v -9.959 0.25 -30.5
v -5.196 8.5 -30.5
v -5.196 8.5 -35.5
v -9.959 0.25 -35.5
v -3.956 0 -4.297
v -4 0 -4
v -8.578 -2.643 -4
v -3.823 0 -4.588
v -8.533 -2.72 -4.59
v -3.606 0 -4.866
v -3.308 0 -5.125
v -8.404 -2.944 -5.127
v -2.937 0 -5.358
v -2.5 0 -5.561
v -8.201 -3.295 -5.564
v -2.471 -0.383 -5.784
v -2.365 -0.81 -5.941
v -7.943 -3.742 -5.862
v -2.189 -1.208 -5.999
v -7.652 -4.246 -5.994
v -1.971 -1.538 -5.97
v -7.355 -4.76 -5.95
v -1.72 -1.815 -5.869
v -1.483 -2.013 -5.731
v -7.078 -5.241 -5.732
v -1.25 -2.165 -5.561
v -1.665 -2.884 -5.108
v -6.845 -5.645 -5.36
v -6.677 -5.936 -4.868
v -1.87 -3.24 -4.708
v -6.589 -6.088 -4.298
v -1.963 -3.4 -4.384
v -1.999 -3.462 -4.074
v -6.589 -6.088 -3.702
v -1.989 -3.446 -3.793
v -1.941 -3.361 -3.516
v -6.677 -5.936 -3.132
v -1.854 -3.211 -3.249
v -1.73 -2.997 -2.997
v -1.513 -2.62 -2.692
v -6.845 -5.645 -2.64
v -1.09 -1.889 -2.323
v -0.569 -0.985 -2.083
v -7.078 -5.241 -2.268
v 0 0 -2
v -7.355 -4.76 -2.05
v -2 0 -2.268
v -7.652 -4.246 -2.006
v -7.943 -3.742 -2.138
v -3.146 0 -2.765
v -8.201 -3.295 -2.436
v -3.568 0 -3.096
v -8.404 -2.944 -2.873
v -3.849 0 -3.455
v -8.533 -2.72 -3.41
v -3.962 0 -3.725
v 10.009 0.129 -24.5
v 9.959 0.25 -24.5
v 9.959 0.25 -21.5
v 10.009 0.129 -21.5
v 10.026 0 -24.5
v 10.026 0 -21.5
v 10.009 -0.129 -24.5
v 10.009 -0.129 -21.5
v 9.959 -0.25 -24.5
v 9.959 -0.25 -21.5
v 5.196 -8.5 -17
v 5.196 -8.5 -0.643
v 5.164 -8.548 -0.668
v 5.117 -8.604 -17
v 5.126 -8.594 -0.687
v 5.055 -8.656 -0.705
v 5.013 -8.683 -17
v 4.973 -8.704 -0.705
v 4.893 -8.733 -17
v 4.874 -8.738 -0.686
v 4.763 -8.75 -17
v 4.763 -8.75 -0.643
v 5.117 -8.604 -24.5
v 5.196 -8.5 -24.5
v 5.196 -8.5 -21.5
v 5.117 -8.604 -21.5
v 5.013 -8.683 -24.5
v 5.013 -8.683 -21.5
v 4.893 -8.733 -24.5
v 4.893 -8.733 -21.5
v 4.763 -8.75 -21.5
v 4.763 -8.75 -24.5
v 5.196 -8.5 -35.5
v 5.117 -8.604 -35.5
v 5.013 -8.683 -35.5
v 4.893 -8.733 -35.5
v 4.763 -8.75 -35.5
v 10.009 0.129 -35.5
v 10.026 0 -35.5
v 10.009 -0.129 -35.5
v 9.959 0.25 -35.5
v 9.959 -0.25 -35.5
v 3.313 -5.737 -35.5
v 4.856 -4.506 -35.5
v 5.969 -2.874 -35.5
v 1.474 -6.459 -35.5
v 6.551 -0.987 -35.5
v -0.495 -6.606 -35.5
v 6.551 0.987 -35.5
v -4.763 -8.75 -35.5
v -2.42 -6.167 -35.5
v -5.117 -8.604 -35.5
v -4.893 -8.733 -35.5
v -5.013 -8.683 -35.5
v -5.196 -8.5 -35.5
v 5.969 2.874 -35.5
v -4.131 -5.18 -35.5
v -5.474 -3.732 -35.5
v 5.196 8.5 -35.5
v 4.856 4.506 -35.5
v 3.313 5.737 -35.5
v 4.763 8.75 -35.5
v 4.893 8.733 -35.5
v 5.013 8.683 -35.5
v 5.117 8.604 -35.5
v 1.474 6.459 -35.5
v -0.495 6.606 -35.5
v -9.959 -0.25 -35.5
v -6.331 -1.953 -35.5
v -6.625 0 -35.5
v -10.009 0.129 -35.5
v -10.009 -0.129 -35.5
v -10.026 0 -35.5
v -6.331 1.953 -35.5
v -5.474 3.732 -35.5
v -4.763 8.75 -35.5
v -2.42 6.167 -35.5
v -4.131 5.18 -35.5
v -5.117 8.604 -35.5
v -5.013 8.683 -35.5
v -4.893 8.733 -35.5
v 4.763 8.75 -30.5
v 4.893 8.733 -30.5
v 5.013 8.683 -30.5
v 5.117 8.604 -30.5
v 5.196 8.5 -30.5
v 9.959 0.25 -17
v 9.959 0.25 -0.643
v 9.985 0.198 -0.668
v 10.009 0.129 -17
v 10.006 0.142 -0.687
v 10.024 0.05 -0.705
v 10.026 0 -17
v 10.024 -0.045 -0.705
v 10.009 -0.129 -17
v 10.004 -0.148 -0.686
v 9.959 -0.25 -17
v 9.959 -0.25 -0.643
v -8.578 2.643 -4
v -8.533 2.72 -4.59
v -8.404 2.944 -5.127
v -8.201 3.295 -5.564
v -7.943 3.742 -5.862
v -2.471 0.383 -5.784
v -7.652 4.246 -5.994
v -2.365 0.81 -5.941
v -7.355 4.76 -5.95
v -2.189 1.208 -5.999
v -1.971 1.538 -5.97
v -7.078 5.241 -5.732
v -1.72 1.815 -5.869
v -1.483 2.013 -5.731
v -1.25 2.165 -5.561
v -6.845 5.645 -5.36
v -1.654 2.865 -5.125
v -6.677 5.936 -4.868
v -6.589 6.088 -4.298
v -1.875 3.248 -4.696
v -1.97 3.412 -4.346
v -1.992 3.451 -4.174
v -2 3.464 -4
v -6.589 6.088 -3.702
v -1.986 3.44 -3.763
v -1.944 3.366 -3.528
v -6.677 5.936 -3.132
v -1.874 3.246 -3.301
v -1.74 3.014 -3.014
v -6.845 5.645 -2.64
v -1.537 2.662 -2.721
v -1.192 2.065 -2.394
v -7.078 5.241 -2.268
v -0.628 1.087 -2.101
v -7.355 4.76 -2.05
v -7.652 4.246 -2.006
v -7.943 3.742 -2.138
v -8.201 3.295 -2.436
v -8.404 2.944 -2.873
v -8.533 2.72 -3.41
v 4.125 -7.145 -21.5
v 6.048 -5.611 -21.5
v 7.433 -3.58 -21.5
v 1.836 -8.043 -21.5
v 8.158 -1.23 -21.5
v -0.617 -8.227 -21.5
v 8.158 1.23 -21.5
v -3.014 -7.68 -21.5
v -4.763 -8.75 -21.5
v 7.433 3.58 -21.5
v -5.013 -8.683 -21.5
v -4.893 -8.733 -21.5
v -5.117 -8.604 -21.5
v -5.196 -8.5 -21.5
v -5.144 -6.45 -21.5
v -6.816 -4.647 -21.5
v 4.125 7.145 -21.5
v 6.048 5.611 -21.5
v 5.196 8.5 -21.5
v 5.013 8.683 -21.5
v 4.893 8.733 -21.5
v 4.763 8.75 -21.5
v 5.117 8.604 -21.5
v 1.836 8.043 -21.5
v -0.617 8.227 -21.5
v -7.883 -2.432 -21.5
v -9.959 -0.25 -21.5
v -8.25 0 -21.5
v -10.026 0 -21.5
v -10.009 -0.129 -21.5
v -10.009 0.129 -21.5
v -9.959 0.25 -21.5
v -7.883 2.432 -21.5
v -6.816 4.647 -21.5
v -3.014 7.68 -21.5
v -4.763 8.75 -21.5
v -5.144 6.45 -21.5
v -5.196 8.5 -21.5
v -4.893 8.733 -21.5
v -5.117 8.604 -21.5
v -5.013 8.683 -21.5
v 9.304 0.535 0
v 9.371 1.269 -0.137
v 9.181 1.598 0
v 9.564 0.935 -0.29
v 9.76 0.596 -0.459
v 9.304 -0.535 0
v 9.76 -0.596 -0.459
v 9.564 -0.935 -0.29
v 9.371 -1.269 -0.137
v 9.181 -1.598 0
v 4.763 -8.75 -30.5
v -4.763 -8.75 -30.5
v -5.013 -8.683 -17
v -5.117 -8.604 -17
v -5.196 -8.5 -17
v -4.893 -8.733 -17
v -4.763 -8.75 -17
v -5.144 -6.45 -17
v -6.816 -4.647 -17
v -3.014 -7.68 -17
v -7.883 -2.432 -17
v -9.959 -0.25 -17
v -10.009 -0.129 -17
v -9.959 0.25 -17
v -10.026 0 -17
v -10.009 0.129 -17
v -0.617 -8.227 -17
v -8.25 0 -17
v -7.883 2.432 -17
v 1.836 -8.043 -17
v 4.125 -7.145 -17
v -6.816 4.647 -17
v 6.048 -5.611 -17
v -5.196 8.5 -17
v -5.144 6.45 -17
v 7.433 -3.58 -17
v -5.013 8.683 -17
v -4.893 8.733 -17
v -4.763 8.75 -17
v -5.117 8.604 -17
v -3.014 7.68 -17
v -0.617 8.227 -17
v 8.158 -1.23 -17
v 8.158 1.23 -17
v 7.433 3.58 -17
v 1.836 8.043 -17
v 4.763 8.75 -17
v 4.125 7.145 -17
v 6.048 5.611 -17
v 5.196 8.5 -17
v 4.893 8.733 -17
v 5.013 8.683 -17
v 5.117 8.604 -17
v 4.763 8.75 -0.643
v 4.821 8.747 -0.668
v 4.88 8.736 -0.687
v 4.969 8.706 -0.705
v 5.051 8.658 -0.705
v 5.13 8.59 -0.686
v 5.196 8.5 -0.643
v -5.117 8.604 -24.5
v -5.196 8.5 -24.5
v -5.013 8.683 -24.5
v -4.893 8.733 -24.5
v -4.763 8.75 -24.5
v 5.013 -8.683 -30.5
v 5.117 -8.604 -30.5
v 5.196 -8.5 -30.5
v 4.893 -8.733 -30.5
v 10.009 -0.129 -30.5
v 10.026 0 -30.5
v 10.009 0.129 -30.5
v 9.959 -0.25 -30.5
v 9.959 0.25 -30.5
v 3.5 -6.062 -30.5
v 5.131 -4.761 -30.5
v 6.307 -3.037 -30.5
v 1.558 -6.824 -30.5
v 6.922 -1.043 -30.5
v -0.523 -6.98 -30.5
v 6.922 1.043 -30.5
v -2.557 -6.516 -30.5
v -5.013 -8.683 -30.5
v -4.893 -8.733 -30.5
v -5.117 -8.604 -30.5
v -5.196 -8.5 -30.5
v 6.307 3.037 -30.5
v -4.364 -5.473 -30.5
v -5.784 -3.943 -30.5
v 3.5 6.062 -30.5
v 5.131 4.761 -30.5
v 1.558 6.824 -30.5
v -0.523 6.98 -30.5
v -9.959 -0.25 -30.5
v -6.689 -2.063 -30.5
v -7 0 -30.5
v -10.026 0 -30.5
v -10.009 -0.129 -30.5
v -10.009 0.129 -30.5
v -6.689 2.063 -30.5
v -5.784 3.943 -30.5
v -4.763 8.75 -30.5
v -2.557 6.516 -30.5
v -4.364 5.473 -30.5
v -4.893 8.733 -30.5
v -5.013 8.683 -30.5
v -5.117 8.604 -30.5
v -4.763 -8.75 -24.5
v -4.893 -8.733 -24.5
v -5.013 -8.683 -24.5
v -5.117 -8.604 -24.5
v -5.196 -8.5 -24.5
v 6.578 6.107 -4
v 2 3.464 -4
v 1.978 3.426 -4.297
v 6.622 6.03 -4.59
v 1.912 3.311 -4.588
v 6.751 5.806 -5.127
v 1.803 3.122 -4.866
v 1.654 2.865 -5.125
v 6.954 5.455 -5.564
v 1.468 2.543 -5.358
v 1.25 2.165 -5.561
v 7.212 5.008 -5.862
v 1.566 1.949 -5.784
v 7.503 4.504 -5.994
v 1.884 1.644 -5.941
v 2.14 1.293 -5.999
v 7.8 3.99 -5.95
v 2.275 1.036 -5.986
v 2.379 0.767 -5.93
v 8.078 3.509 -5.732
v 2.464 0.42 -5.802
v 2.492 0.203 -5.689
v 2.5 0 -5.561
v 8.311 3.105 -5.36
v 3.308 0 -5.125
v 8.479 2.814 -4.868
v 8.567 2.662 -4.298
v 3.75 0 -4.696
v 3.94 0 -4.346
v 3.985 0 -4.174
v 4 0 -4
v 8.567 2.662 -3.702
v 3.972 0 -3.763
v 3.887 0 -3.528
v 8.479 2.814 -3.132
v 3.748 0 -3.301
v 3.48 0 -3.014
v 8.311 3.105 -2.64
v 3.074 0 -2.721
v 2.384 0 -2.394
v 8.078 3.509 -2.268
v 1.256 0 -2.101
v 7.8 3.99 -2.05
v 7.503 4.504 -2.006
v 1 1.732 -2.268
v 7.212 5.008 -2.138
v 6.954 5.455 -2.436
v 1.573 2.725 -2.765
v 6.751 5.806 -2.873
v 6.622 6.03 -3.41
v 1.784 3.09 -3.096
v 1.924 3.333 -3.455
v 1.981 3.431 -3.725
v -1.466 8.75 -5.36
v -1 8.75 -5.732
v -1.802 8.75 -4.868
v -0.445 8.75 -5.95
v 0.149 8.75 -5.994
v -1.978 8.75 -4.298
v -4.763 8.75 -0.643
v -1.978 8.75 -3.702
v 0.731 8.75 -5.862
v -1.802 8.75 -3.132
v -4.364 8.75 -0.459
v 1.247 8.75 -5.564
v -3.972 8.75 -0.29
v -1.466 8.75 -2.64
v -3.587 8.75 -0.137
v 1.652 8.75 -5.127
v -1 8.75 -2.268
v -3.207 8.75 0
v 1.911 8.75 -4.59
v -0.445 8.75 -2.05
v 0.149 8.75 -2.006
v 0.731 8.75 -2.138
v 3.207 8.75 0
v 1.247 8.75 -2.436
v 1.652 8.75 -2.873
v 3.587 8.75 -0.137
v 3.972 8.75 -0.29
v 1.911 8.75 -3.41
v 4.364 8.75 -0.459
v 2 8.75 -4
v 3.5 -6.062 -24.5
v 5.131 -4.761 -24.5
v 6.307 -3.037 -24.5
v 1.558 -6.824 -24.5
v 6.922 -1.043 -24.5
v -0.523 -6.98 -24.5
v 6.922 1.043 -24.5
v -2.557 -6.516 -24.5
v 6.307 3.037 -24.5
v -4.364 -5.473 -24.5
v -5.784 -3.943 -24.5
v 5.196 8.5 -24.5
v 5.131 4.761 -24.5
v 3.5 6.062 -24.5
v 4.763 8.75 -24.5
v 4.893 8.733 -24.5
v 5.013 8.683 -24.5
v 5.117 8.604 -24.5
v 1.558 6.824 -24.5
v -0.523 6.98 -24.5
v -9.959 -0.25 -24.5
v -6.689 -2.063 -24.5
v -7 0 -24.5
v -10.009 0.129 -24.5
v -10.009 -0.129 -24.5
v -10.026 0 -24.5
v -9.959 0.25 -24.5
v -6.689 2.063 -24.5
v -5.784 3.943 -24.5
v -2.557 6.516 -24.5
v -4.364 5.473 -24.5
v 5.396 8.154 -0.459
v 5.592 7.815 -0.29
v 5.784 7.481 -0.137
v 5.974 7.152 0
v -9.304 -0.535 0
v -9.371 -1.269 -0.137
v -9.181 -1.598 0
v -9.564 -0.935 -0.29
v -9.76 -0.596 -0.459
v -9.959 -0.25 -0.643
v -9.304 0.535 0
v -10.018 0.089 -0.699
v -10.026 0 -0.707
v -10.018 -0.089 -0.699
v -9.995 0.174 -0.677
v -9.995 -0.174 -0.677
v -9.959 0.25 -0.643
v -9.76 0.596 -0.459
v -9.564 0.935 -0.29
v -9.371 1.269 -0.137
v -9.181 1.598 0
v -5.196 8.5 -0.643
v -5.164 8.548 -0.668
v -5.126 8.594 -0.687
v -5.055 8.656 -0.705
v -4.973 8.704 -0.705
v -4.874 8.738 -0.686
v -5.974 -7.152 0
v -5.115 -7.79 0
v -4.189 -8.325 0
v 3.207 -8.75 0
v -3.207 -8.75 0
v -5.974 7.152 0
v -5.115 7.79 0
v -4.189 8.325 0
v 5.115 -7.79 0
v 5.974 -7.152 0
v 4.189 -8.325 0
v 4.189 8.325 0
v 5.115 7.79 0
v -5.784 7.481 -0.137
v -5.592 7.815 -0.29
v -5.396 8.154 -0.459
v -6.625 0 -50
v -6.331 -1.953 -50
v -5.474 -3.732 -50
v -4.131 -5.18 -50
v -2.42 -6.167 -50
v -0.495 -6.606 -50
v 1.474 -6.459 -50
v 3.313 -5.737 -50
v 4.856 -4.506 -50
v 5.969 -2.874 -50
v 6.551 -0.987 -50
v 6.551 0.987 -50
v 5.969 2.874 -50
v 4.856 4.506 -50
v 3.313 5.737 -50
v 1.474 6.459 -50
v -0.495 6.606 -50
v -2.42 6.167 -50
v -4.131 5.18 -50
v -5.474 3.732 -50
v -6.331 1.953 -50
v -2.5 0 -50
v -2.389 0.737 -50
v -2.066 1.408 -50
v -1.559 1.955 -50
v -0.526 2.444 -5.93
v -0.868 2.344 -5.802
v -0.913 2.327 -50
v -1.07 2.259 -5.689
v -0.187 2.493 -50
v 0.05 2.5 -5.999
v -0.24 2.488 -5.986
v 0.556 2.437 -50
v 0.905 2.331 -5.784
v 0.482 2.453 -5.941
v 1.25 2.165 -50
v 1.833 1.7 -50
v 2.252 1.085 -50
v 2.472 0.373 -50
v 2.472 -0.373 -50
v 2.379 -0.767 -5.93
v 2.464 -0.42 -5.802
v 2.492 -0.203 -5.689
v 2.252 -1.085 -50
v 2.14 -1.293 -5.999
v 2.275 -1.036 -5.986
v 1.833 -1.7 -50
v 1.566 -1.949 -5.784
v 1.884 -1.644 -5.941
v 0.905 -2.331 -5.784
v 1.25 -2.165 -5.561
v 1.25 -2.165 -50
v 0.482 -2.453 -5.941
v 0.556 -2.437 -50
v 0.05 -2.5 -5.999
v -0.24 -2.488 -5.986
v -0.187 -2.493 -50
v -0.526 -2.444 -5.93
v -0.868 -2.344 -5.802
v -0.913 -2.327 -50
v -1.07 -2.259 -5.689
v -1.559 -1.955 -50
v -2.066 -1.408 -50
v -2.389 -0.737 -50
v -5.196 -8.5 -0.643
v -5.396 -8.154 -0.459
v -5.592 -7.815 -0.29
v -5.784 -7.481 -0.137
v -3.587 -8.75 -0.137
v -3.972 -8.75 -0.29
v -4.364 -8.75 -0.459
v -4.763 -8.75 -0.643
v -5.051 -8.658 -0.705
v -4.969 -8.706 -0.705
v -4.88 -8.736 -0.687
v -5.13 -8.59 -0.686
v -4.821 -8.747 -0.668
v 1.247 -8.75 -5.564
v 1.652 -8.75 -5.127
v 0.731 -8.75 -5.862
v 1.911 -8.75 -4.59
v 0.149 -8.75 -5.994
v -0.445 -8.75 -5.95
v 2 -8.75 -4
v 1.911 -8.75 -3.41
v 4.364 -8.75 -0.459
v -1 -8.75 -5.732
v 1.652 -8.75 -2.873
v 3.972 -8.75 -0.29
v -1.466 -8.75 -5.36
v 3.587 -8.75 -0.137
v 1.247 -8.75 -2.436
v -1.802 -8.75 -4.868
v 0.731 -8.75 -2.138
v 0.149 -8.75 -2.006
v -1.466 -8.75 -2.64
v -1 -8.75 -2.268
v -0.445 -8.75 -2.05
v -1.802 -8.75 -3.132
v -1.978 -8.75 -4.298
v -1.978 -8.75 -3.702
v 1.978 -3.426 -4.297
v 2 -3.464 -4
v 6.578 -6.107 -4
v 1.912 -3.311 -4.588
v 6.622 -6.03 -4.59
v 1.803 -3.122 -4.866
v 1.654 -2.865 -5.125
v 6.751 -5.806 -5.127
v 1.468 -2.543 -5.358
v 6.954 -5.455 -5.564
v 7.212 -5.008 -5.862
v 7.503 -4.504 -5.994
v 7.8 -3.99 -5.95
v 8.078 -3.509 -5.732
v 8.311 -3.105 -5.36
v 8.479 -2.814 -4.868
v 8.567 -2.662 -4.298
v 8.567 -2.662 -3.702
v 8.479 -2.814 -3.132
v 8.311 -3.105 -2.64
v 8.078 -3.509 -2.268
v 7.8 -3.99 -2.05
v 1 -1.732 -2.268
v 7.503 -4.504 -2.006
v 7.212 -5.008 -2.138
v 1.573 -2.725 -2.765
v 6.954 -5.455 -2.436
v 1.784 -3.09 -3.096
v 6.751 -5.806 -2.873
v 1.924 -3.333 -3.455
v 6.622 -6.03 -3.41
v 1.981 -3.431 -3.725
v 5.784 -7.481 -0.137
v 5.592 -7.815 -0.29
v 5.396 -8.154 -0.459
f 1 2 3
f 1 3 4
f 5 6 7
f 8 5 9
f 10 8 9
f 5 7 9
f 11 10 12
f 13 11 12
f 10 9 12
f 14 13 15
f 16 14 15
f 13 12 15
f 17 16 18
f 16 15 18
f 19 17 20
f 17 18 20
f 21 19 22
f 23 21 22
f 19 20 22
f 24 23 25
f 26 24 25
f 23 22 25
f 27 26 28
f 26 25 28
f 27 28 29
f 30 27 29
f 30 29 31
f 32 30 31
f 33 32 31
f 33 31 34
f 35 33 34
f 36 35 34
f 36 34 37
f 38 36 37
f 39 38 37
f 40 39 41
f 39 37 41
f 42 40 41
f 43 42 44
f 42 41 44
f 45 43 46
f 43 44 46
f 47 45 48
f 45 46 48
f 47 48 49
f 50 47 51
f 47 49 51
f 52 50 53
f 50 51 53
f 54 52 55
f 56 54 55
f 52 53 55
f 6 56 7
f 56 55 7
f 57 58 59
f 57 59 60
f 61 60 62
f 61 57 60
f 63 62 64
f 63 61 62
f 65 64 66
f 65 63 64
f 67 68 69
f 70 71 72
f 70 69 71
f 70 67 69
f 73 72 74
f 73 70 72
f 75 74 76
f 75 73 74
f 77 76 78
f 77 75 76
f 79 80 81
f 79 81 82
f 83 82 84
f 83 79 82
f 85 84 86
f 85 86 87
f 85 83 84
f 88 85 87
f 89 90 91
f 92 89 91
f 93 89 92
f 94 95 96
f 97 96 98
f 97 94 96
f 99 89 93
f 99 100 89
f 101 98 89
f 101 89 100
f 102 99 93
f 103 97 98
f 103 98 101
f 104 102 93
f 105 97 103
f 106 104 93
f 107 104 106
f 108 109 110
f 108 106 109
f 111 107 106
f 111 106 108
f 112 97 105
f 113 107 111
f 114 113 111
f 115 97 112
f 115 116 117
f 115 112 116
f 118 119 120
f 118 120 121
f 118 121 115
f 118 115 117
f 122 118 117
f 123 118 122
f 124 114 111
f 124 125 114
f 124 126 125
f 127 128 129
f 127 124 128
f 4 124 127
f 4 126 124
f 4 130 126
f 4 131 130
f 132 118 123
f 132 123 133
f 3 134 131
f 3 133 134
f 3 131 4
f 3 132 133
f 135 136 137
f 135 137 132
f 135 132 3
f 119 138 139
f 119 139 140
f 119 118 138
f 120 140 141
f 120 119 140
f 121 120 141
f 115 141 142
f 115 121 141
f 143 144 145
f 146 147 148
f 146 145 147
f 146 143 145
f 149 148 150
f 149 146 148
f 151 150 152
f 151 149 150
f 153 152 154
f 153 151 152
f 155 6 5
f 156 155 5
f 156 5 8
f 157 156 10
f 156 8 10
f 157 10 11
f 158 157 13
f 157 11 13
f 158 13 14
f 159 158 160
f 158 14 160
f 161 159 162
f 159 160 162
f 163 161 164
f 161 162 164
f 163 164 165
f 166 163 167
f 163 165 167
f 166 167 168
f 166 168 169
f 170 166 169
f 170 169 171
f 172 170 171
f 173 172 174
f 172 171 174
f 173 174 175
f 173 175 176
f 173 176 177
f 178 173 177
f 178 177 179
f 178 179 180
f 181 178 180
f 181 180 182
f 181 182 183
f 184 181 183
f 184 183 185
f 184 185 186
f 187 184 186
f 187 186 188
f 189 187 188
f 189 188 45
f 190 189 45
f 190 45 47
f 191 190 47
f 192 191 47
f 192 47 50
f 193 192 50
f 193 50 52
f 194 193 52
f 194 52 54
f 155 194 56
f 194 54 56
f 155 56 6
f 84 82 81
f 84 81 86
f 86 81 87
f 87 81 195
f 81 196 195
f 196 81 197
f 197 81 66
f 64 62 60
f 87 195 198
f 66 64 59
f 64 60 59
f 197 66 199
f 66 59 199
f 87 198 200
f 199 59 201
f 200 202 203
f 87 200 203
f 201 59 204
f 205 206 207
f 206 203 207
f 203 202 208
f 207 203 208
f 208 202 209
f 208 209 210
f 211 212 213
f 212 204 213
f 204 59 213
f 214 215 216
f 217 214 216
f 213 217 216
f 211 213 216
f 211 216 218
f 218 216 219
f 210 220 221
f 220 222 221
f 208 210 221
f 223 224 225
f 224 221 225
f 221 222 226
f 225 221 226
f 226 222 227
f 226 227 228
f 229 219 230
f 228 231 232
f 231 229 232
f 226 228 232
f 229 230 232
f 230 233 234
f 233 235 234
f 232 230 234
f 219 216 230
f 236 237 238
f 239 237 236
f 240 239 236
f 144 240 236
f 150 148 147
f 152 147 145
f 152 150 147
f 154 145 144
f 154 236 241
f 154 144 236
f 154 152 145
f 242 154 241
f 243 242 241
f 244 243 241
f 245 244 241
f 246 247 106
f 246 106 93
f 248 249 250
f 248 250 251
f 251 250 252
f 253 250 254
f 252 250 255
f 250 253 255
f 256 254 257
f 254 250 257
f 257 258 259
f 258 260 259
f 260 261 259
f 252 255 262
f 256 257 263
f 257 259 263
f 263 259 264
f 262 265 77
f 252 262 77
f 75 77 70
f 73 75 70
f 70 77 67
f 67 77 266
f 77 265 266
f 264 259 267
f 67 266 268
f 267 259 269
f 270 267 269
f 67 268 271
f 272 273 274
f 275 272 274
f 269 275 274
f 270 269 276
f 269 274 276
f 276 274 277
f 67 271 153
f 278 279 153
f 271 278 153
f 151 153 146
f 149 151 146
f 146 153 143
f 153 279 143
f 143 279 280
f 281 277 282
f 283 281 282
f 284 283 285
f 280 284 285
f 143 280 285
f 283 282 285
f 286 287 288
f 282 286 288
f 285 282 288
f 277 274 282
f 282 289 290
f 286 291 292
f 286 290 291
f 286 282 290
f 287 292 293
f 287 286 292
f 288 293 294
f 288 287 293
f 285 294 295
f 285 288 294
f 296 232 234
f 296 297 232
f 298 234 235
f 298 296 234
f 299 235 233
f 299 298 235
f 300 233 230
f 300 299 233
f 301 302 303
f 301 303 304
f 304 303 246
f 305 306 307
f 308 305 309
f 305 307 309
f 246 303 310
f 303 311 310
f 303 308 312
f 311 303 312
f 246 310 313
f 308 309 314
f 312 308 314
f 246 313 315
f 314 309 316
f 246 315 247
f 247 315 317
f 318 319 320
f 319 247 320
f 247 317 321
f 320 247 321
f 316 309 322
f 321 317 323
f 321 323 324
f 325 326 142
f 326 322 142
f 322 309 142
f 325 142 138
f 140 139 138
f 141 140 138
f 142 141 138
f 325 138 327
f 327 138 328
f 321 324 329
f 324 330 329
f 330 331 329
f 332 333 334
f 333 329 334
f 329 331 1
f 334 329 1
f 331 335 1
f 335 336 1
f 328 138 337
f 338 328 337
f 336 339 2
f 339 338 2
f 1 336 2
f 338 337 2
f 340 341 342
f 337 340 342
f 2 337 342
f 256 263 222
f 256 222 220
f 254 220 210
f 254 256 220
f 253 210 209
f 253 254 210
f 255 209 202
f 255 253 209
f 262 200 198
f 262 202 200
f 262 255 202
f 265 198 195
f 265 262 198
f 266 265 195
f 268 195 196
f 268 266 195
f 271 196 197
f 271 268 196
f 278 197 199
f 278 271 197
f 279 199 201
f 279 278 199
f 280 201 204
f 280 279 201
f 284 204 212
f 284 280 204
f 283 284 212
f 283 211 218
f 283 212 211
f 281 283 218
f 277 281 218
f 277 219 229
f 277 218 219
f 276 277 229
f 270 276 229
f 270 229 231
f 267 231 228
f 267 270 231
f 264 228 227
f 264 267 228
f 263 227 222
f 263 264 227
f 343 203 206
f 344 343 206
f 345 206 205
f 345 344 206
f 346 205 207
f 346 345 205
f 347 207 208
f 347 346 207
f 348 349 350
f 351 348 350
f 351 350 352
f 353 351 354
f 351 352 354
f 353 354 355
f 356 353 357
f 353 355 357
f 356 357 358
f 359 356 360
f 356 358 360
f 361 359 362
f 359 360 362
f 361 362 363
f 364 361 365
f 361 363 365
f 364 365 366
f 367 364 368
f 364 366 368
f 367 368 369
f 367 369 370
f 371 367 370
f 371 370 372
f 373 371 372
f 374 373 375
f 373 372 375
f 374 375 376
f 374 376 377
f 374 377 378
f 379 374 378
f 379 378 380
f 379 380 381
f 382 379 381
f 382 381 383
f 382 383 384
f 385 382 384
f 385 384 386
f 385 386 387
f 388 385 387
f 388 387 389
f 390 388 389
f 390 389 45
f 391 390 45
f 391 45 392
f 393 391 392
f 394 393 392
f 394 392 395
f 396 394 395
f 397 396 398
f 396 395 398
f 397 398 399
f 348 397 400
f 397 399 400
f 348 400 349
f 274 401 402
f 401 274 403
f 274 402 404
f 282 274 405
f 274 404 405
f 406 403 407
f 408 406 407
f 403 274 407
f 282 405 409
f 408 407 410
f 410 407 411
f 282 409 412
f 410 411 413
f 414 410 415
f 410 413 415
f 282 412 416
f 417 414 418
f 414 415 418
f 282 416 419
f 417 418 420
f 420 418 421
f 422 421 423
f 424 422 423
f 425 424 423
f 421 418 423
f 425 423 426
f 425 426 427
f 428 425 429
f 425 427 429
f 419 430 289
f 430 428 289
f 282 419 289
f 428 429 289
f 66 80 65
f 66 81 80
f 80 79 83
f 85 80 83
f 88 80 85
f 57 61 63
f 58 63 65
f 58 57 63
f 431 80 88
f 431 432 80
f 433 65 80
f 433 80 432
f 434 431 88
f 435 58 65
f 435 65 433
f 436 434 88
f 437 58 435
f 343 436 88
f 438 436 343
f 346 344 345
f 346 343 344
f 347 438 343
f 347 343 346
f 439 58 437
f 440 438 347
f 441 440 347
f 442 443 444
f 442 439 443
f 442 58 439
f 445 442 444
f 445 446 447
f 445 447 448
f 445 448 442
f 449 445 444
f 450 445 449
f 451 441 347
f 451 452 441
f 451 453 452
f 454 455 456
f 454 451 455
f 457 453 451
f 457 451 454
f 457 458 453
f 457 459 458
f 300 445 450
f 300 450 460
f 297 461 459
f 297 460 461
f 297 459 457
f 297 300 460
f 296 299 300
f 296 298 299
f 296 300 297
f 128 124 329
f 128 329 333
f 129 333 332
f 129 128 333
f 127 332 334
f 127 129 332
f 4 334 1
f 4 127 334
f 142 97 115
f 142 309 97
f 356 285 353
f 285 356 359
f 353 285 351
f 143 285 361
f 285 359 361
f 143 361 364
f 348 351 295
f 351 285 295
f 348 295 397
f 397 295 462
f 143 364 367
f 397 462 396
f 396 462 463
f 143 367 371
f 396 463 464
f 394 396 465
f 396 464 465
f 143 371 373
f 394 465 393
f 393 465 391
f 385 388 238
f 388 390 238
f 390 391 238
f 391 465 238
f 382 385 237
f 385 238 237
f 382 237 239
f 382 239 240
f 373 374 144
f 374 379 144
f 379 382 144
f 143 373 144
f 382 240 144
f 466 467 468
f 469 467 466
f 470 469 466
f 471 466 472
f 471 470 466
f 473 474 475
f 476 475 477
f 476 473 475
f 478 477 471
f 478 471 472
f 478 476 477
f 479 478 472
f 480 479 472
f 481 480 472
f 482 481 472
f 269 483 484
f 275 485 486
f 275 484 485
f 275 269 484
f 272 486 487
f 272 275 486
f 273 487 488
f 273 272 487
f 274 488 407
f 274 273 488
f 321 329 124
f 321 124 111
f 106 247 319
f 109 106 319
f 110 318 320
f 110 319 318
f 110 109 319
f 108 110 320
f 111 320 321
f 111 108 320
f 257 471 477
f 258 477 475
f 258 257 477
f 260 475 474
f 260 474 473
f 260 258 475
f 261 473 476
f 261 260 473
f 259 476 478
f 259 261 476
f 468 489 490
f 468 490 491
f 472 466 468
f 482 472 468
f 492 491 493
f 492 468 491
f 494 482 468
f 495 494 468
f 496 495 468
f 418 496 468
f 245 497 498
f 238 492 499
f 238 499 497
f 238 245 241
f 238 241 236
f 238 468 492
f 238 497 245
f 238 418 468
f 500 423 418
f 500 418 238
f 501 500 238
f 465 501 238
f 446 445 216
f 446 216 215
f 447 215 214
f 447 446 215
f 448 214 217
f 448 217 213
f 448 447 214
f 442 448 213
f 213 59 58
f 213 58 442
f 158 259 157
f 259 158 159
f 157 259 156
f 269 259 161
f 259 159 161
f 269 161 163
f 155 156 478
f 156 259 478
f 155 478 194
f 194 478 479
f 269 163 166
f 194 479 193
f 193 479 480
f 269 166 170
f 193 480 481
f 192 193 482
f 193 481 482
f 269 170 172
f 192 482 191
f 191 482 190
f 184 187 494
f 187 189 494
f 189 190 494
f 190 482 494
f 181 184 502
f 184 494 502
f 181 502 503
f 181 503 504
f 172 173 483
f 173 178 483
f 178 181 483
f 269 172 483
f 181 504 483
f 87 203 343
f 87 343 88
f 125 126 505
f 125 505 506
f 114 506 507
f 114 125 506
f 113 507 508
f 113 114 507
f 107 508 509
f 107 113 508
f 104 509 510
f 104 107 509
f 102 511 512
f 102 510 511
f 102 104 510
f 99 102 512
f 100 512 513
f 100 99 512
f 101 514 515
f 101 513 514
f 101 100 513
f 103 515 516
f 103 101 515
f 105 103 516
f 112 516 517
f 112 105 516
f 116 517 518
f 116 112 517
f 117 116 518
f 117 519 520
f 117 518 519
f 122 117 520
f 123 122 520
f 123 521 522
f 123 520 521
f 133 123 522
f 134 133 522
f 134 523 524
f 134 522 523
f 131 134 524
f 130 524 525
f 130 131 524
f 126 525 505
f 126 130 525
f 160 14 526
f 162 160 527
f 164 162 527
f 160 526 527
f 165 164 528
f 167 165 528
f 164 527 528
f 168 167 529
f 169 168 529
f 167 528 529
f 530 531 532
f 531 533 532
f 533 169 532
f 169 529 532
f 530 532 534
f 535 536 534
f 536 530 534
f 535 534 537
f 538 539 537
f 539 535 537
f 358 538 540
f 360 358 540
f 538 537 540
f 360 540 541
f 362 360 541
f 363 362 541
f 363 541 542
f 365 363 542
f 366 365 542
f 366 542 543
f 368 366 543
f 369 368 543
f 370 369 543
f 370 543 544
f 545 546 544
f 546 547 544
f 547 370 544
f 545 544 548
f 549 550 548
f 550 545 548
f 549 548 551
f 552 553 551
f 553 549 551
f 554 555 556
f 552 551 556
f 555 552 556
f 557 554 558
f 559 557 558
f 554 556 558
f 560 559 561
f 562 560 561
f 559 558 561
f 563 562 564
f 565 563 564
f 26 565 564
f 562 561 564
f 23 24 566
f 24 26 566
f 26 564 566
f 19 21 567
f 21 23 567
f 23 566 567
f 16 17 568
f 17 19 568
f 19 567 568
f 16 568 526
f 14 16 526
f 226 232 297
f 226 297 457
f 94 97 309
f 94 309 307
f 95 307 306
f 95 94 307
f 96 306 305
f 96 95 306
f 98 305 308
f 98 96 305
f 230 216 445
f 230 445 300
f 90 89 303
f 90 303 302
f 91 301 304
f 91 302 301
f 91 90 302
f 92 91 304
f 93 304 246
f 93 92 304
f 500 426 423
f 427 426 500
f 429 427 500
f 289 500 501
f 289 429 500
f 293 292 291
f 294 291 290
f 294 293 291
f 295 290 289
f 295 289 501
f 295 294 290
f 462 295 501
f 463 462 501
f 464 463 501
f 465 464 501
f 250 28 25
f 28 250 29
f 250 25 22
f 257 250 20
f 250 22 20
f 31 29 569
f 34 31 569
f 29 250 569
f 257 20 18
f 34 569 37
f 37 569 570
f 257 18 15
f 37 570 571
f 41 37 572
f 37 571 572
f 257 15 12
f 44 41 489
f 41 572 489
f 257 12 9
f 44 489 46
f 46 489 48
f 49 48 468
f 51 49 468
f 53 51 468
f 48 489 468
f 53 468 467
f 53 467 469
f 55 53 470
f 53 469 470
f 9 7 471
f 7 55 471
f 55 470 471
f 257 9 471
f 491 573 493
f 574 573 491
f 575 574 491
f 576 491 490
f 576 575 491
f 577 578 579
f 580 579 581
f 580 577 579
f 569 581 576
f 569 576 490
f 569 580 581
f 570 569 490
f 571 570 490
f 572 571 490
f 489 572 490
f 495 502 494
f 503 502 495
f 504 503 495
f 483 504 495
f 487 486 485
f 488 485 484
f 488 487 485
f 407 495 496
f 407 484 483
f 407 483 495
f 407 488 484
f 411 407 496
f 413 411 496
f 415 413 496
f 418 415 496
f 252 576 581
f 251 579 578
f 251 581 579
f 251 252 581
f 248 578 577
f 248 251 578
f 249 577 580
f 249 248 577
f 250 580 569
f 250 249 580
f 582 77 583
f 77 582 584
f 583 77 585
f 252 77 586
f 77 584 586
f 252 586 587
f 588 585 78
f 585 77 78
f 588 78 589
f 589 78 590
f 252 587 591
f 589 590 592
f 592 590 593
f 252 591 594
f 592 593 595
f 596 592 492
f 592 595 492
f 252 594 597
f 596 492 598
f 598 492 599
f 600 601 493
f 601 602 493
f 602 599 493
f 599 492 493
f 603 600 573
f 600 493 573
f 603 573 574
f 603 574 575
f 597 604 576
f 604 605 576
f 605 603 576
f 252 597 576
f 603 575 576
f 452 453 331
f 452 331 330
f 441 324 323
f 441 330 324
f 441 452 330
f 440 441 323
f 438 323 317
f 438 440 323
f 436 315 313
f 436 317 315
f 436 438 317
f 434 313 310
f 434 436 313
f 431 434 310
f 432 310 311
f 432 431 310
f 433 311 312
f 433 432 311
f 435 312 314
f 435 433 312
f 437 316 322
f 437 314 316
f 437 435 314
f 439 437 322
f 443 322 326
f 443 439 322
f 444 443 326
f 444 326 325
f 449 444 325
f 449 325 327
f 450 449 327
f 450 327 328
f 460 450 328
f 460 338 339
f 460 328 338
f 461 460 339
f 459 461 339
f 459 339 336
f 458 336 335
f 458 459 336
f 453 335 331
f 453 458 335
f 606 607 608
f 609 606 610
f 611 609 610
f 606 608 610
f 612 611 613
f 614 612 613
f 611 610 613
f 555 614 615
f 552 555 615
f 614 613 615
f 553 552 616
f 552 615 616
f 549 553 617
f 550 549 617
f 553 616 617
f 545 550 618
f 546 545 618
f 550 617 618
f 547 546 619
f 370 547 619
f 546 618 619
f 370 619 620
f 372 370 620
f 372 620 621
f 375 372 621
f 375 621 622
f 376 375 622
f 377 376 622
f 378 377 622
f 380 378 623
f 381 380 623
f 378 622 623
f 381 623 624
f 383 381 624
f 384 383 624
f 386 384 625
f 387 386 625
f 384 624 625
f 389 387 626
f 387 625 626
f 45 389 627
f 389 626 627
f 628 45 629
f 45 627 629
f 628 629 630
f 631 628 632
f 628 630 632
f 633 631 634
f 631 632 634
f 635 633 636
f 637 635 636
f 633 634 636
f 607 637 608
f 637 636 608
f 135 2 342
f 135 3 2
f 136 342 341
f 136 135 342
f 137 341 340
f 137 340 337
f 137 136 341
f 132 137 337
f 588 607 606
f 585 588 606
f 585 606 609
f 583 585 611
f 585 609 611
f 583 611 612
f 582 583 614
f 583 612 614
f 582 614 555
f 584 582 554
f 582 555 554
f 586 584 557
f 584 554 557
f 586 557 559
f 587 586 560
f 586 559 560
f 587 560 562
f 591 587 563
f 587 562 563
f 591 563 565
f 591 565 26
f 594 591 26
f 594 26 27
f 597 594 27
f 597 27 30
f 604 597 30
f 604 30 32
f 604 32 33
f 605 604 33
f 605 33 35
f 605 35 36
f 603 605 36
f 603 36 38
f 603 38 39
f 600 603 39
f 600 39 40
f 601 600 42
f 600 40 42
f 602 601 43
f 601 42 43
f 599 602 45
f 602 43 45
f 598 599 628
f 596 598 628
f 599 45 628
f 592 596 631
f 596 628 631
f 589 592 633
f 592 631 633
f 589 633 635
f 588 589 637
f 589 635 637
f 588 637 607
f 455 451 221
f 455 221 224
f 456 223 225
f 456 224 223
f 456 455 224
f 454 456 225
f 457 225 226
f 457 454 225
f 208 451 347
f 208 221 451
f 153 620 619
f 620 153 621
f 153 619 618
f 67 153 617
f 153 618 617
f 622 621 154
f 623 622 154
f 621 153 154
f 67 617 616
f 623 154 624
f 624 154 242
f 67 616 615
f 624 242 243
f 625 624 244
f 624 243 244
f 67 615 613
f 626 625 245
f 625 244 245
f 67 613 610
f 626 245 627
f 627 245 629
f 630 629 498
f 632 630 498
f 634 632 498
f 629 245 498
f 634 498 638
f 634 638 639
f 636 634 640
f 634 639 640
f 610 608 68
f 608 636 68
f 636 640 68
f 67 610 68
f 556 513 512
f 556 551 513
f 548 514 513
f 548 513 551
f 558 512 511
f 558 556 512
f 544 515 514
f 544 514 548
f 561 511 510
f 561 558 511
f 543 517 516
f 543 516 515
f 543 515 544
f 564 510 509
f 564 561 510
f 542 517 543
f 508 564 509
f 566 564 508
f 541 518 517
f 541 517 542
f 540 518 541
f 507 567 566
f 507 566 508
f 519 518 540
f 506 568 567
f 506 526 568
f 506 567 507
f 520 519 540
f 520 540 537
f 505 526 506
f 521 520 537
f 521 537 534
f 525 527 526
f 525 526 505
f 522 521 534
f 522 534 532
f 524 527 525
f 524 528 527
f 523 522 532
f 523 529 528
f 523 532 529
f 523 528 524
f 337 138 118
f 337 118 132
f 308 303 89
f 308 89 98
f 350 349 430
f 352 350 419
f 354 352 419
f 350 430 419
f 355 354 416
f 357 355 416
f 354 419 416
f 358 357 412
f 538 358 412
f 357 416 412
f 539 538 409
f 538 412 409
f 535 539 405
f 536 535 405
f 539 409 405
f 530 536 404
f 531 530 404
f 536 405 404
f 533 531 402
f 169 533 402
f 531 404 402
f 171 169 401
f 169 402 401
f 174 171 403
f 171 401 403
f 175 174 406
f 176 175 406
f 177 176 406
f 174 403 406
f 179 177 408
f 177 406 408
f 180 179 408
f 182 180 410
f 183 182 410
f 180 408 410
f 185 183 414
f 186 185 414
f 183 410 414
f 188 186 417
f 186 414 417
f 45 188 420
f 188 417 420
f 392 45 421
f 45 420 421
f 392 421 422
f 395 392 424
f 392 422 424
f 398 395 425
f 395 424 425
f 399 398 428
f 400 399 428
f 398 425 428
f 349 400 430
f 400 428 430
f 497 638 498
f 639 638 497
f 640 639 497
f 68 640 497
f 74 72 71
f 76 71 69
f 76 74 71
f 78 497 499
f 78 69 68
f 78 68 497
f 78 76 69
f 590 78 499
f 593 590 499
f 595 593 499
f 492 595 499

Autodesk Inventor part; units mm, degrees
ref_plane "YZ Plane" through (0, 0, 0) normal (1, 0, 0) x (0, 1, 0)
ref_plane "XZ Plane" through (0, 0, 0) normal (0, 1, 0) x (-1, 0, 0)
ref_plane "XY Plane" through (0, 0, 0) normal (0, 0, 1) x (1, 0, 0)
sketch "Sketch1" plane through (0, 0, 0) normal (0, 0, 1) x (1, 0, 0)
  line L0 (5.0518, 8.75) -> (10.1036, 0)
  line L1 (10.1036, 0) -> (5.0518, -8.75)
  line L2 (5.0518, -8.75) -> (-5.0518, -8.75)
  line L3 (-5.0518, -8.75) -> (-10.1036, 0)
  line L4 (-10.1036, 0) -> (-5.0518, 8.75)
  line L5 (-5.0518, 8.75) -> (5.0518, 8.75)
  point P0 (0, 0)
  point P1 (0, 0)
  dimension "d0" = 17.5
extrude "Extrusion1" add sketch "Sketch1" against normal blind 17
sketch "Sketch2" plane through (0, 0, -17) normal (0, 0, -1) x (-1, 0, 0)
  line L0 (-5.0518, 8.75) -> (5.0518, 8.75) projected
  line L1 (-10.1036, 0) -> (-5.0518, 8.75) projected
  line L2 (-5.0518, -8.75) -> (-10.1036, 0) projected
  line L3 (5.0518, -8.75) -> (-5.0518, -8.75) projected
  line L4 (10.1036, 0) -> (5.0518, -8.75) projected
  line L5 (5.0518, 8.75) -> (10.1036, 0) projected
  line L6 (-5.0518, 8.75) -> (5.0518, 8.75) projected
  circle A0 centre (0, 0) radius 8.25
  dimension "d3" = 16.5
extrude "Extrusion2" add sketch "Sketch2" along normal blind 4.5 contours A0
sketch "Sketch3" plane through (0, 0, -21.5) normal (0, 0, -1) x (-1, 0, 0)
  circle A0 centre (0, 0) radius 8.25 projected
  line L0 (-5.0518, 8.75) -> (5.0518, 8.75) projected
  line L1 (-10.1036, 0) -> (-5.0518, 8.75) projected
  line L2 (-5.0518, -8.75) -> (-10.1036, 0) projected
  line L3 (5.0518, -8.75) -> (-5.0518, -8.75) projected
  line L4 (10.1036, 0) -> (5.0518, -8.75) projected
  line L5 (5.0518, 8.75) -> (10.1036, 0) projected
extrude "Extrusion3" add sketch "Sketch3" along normal blind 3 contours A0 | L0 L5 L4 L3 L2 L1
sketch "Sketch4" plane through (0, 0, -24.5) normal (0, 0, -1) x (-1, 0, 0)
  line L0 (5.0518, 8.75) -> (10.1036, 0) projected
  line L1 (-5.0518, 8.75) -> (5.0518, 8.75) projected
  line L2 (-10.1036, 0) -> (-5.0518, 8.75) projected
  line L3 (-5.0518, -8.75) -> (-10.1036, 0) projected
  line L4 (5.0518, -8.75) -> (-5.0518, -8.75) projected
  line L5 (10.1036, 0) -> (5.0518, -8.75) projected
  circle A0 centre (0, 0) radius 7
  dimension "d8" = 14
extrude "Extrusion4" add sketch "Sketch4" along normal blind 6 contours A0
sketch "Sketch5" plane through (0, 0, -30.5) normal (0, 0, -1) x (-1, 0, 0)
  circle A0 centre (0, 0) radius 7 projected
  line L0 (5.0518, 8.75) -> (10.1036, 0) projected
  line L1 (-5.0518, 8.75) -> (5.0518, 8.75) projected
  line L2 (-10.1036, 0) -> (-5.0518, 8.75) projected
  line L3 (-5.0518, -8.75) -> (-10.1036, 0) projected
  line L4 (5.0518, -8.75) -> (-5.0518, -8.75) projected
  line L5 (10.1036, 0) -> (5.0518, -8.75) projected
extrude "Extrusion5" add sketch "Sketch5" along normal blind 5 contours A0 | L0 L5 L4 L3 L2 L1
sketch "Sketch6" plane through (0, 0, -35.5) normal (0, 0, -1) x (-1, 0, 0)
  line L0 (10.1036, 0) -> (5.0518, -8.75) projected
  line L1 (5.0518, 8.75) -> (10.1036, 0) projected
  line L2 (-5.0518, 8.75) -> (5.0518, 8.75) projected
  line L3 (-10.1036, 0) -> (-5.0518, 8.75) projected
  line L4 (-5.0518, -8.75) -> (-10.1036, 0) projected
  line L5 (5.0518, -8.75) -> (-5.0518, -8.75) projected
  circle A0 centre (0, 0) radius 6.625
  dimension "d13" = 13.25
extrude "Extrusion6" add sketch "Sketch6" along normal blind 14.5 contours A0
sketch "Sketch7" plane through (0, 0, -50) normal (0, 0, -1) x (-1, 0, 0)
  circle A0 centre (0, 0) radius 6.625 projected
  circle A1 centre (0, 0) radius 2.5
  dimension "d16" = 5
extrude "Extrusion7" cut sketch "Sketch7" against normal blind 47.5 contours A1
sketch "Sketch8" plane through (-5.0518, 8.75, 0) normal (0, 1, 0) x (1, 0, 0)
  line L0 (10.1036, 17) -> (0, 17) projected
  line L1 (0, 0) -> (0, 17) projected
  line L2 (0, 0) -> (10.1036, 0) projected
  line L3 (10.1036, 0) -> (10.1036, 17) projected
  circle A0 centre (5.0518, 4) radius 2
  dimension "d19" = 4
  dimension "d20" = 4
extrude "Extrusion8" cut sketch "Sketch8" against normal blind 40.25 contours A0
pattern_circular "Circular Pattern1" count 3 over 360 about axis through (0, 0, -17) along (0, 0, -1) of "Extrusion8"
thread "Thread1" size "1/4" designation "1/4 - 18 NPT" standard "NPT" full length
fillet "Fillet1" radius 0.5 18 edges at (-5.0518, -8.75, -8.5) (5.0518, -8.75, -8.5) (10.1036, 0, -8.5) (5.0518, 8.75, -8.5) (-5.0518, 8.75, -8.5) (-10.1036, 0, -8.5) (-5.0518, -8.75, -23) (5.0518, -8.75, -23) (10.1036, 0, -23) (5.0518, 8.75, -23) (5.0518, 8.75, -33) (10.1036, 0, -33) (5.0518, -8.75, -33) (-5.0518, -8.75, -33) (-10.1036, 0, -23) (-5.0518, 8.75, -23) (-5.0518, 8.75, -33) (-10.1036, 0, -33)
sketch "Sketch10" plane through (0, 0, 0) normal (0, 1, 0) x (-1, 0, 0)
  line L0 (10.0263, 0) -> (10.0263, -17) projected
  line L1 (9.9593, 0) -> (5.1962, 0) projected
  line L2 (9.9593, -17) -> (9.9593, -17) projected
  line L3 (9.9593, -17) -> (9.9593, 0) projected
  line L4 (9.9593, 0) -> (9.9593, 0) projected
  line L5 (9.9593, 0) -> (9.9593, -17) projected
  ellipse E0 centre (7.5777, -4) end of major axis (7.5777, -2) minor radius 1 projected
  line L6 (9.9593, 0) -> (9.9593, -17) projected
  line L7 (9.9593, 0) -> (5.1962, 0) projected
  line L8 (5.1962, -17) -> (5.1962, 0) projected
  line L9 (5.1962, -17) -> (9.9593, -17) projected
  line L10 (10.0263, -0.7071) -> (9.3192, 0)
  line L11 (9.3192, 0) -> (10.0263, 0)
  line L12 (10.0263, -0.7071) -> (10.0263, 0)
  line L13 (0, -20.4) -> (0, 3.4) projected
  dimension "d32" = 45
  dimension "d33" = 1
revolve "Revolution2" cut sketch "Sketch10" angle 360 about axis through (0, 0, -10) along (0, 0, 1) contours L0 L10 L3 L11 | L3 L10 L1
equation "\"d20\" = d19"
properties part number "fc18-055" material "Brass, Soft Yellow"
